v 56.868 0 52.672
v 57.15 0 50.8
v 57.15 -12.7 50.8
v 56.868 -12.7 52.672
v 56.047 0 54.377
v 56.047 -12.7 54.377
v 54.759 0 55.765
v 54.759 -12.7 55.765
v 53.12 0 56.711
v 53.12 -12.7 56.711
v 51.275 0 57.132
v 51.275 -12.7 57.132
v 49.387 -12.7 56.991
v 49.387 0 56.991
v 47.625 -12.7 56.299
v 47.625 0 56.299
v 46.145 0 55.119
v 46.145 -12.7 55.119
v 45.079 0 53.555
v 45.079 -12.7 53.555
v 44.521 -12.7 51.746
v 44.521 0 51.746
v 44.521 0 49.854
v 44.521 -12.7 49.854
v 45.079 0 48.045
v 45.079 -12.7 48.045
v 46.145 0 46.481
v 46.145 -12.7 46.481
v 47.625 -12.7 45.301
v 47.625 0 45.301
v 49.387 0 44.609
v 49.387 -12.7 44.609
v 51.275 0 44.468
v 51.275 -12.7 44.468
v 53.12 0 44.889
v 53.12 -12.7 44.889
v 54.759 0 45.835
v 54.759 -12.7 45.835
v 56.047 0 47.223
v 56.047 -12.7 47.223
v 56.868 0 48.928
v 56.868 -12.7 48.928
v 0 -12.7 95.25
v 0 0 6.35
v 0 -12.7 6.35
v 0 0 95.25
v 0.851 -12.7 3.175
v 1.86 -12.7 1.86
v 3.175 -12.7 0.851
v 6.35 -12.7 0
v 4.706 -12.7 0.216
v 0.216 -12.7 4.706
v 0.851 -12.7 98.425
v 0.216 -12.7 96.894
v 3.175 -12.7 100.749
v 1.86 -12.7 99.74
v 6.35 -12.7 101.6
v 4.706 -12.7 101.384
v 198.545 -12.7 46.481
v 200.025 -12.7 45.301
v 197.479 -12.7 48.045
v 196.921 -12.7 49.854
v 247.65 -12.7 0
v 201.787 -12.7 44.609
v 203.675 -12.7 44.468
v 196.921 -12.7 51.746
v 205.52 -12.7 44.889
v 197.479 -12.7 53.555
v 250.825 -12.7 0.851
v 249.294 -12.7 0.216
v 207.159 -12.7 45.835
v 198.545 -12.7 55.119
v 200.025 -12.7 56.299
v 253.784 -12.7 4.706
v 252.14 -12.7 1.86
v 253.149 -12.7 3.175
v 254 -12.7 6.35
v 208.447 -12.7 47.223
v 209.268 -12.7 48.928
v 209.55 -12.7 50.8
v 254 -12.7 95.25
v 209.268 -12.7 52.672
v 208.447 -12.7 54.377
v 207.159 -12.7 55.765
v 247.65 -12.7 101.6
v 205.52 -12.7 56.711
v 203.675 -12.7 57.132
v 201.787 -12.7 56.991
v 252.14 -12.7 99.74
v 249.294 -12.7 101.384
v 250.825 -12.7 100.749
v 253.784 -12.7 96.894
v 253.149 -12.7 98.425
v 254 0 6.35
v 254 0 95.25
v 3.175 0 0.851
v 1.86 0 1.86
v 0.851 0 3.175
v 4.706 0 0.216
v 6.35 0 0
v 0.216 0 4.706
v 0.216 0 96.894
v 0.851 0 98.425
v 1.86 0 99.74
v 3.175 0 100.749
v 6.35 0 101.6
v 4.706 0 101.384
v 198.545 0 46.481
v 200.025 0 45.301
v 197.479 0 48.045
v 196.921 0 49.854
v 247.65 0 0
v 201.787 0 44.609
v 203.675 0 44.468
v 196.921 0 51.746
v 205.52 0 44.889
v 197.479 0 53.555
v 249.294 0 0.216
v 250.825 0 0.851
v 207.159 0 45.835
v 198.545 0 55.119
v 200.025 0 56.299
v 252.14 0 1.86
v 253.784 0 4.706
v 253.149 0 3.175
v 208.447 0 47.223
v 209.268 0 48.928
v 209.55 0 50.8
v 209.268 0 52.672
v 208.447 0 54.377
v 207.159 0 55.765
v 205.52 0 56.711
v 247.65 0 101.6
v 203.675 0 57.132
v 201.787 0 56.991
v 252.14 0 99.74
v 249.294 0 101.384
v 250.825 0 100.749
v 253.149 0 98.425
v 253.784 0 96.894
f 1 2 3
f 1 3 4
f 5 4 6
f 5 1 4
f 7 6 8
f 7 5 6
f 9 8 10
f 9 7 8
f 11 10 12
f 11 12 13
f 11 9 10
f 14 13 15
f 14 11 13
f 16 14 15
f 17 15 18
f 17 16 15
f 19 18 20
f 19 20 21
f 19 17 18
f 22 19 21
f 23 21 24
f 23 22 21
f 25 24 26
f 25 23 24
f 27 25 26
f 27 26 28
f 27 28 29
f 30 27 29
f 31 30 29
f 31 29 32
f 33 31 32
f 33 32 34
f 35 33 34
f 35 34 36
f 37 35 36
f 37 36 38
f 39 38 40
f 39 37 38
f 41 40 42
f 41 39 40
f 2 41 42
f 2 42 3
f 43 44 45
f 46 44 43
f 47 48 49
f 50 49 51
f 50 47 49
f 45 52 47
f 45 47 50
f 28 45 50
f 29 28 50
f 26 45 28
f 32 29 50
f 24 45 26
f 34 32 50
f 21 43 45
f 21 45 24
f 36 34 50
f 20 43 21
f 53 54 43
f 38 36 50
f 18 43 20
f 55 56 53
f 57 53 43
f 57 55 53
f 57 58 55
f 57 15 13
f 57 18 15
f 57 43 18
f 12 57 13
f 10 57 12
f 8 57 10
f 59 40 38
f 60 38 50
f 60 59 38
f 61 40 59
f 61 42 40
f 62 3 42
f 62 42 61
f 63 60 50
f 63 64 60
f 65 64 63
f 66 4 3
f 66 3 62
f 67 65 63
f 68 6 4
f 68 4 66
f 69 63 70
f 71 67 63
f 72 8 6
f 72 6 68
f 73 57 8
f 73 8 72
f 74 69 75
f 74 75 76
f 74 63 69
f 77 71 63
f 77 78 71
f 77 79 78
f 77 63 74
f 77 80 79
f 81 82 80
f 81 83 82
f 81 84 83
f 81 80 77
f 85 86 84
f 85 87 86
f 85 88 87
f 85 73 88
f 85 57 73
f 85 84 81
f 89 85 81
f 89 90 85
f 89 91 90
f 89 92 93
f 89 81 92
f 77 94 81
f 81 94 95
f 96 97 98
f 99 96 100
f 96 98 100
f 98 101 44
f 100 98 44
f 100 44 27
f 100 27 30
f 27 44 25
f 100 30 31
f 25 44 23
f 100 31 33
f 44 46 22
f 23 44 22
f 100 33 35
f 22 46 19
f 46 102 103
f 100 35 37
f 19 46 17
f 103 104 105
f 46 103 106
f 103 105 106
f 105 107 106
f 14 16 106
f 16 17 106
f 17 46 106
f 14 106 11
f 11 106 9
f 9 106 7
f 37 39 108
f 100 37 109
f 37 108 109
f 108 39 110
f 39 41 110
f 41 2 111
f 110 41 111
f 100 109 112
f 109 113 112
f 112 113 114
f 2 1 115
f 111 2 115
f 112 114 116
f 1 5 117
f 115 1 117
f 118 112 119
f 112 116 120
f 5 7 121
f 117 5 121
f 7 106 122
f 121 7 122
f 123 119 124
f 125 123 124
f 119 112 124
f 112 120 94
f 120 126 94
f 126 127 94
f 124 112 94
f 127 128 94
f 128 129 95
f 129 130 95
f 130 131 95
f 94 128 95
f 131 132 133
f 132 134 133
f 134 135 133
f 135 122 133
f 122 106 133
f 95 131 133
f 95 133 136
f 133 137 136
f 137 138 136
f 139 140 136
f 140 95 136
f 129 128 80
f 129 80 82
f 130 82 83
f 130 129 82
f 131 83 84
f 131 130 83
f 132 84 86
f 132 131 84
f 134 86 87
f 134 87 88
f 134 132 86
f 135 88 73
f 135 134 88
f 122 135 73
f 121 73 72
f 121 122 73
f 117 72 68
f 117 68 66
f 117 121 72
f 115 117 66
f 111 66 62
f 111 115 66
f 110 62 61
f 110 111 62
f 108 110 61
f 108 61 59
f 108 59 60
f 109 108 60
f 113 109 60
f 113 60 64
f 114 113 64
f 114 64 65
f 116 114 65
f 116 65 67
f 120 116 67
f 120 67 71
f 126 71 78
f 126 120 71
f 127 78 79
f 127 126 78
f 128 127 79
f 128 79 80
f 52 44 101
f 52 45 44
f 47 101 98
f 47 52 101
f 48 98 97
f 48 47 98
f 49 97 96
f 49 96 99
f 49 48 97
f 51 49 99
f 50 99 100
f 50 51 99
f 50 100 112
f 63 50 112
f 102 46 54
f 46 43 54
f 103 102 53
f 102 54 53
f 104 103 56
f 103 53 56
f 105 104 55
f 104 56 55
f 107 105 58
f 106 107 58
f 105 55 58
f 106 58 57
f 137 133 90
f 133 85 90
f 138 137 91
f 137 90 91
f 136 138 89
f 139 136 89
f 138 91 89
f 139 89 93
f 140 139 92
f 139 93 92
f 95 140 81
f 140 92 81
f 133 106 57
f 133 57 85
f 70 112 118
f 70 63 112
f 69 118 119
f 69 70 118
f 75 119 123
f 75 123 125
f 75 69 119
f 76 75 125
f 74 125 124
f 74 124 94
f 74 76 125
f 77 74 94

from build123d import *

# Parameters (mm, degrees)
F0_W     = 254
F0_H     = 101.6
F0_R     = 6.35
F1_DEPTH = 12.7
F2_R     = 6.35


with BuildPart() as f1:
    # F0 (on Front) → F1 (new body)
    with BuildSketch(Plane.XZ):
        with Locations((127, 50.8)):
            Rectangle(F0_W, F0_H)
        with Locations((50.8, 50.8)):
            Circle(F0_R, mode=Mode.SUBTRACT)
        with Locations((203.2, 50.8)):
            Circle(F0_R, mode=Mode.SUBTRACT)
    extrude(amount=F1_DEPTH)

    # F2
    f2_edges = [f1.edges().sort_by_distance(p)[0] for p in [
        (0, -6.35, 101.6),
        (254, -6.35, 101.6),
        (254, -6.35, 0),
        (0, -6.35, 0),
    ]]
    fillet(f2_edges, radius=F2_R)


solid = f1.part
